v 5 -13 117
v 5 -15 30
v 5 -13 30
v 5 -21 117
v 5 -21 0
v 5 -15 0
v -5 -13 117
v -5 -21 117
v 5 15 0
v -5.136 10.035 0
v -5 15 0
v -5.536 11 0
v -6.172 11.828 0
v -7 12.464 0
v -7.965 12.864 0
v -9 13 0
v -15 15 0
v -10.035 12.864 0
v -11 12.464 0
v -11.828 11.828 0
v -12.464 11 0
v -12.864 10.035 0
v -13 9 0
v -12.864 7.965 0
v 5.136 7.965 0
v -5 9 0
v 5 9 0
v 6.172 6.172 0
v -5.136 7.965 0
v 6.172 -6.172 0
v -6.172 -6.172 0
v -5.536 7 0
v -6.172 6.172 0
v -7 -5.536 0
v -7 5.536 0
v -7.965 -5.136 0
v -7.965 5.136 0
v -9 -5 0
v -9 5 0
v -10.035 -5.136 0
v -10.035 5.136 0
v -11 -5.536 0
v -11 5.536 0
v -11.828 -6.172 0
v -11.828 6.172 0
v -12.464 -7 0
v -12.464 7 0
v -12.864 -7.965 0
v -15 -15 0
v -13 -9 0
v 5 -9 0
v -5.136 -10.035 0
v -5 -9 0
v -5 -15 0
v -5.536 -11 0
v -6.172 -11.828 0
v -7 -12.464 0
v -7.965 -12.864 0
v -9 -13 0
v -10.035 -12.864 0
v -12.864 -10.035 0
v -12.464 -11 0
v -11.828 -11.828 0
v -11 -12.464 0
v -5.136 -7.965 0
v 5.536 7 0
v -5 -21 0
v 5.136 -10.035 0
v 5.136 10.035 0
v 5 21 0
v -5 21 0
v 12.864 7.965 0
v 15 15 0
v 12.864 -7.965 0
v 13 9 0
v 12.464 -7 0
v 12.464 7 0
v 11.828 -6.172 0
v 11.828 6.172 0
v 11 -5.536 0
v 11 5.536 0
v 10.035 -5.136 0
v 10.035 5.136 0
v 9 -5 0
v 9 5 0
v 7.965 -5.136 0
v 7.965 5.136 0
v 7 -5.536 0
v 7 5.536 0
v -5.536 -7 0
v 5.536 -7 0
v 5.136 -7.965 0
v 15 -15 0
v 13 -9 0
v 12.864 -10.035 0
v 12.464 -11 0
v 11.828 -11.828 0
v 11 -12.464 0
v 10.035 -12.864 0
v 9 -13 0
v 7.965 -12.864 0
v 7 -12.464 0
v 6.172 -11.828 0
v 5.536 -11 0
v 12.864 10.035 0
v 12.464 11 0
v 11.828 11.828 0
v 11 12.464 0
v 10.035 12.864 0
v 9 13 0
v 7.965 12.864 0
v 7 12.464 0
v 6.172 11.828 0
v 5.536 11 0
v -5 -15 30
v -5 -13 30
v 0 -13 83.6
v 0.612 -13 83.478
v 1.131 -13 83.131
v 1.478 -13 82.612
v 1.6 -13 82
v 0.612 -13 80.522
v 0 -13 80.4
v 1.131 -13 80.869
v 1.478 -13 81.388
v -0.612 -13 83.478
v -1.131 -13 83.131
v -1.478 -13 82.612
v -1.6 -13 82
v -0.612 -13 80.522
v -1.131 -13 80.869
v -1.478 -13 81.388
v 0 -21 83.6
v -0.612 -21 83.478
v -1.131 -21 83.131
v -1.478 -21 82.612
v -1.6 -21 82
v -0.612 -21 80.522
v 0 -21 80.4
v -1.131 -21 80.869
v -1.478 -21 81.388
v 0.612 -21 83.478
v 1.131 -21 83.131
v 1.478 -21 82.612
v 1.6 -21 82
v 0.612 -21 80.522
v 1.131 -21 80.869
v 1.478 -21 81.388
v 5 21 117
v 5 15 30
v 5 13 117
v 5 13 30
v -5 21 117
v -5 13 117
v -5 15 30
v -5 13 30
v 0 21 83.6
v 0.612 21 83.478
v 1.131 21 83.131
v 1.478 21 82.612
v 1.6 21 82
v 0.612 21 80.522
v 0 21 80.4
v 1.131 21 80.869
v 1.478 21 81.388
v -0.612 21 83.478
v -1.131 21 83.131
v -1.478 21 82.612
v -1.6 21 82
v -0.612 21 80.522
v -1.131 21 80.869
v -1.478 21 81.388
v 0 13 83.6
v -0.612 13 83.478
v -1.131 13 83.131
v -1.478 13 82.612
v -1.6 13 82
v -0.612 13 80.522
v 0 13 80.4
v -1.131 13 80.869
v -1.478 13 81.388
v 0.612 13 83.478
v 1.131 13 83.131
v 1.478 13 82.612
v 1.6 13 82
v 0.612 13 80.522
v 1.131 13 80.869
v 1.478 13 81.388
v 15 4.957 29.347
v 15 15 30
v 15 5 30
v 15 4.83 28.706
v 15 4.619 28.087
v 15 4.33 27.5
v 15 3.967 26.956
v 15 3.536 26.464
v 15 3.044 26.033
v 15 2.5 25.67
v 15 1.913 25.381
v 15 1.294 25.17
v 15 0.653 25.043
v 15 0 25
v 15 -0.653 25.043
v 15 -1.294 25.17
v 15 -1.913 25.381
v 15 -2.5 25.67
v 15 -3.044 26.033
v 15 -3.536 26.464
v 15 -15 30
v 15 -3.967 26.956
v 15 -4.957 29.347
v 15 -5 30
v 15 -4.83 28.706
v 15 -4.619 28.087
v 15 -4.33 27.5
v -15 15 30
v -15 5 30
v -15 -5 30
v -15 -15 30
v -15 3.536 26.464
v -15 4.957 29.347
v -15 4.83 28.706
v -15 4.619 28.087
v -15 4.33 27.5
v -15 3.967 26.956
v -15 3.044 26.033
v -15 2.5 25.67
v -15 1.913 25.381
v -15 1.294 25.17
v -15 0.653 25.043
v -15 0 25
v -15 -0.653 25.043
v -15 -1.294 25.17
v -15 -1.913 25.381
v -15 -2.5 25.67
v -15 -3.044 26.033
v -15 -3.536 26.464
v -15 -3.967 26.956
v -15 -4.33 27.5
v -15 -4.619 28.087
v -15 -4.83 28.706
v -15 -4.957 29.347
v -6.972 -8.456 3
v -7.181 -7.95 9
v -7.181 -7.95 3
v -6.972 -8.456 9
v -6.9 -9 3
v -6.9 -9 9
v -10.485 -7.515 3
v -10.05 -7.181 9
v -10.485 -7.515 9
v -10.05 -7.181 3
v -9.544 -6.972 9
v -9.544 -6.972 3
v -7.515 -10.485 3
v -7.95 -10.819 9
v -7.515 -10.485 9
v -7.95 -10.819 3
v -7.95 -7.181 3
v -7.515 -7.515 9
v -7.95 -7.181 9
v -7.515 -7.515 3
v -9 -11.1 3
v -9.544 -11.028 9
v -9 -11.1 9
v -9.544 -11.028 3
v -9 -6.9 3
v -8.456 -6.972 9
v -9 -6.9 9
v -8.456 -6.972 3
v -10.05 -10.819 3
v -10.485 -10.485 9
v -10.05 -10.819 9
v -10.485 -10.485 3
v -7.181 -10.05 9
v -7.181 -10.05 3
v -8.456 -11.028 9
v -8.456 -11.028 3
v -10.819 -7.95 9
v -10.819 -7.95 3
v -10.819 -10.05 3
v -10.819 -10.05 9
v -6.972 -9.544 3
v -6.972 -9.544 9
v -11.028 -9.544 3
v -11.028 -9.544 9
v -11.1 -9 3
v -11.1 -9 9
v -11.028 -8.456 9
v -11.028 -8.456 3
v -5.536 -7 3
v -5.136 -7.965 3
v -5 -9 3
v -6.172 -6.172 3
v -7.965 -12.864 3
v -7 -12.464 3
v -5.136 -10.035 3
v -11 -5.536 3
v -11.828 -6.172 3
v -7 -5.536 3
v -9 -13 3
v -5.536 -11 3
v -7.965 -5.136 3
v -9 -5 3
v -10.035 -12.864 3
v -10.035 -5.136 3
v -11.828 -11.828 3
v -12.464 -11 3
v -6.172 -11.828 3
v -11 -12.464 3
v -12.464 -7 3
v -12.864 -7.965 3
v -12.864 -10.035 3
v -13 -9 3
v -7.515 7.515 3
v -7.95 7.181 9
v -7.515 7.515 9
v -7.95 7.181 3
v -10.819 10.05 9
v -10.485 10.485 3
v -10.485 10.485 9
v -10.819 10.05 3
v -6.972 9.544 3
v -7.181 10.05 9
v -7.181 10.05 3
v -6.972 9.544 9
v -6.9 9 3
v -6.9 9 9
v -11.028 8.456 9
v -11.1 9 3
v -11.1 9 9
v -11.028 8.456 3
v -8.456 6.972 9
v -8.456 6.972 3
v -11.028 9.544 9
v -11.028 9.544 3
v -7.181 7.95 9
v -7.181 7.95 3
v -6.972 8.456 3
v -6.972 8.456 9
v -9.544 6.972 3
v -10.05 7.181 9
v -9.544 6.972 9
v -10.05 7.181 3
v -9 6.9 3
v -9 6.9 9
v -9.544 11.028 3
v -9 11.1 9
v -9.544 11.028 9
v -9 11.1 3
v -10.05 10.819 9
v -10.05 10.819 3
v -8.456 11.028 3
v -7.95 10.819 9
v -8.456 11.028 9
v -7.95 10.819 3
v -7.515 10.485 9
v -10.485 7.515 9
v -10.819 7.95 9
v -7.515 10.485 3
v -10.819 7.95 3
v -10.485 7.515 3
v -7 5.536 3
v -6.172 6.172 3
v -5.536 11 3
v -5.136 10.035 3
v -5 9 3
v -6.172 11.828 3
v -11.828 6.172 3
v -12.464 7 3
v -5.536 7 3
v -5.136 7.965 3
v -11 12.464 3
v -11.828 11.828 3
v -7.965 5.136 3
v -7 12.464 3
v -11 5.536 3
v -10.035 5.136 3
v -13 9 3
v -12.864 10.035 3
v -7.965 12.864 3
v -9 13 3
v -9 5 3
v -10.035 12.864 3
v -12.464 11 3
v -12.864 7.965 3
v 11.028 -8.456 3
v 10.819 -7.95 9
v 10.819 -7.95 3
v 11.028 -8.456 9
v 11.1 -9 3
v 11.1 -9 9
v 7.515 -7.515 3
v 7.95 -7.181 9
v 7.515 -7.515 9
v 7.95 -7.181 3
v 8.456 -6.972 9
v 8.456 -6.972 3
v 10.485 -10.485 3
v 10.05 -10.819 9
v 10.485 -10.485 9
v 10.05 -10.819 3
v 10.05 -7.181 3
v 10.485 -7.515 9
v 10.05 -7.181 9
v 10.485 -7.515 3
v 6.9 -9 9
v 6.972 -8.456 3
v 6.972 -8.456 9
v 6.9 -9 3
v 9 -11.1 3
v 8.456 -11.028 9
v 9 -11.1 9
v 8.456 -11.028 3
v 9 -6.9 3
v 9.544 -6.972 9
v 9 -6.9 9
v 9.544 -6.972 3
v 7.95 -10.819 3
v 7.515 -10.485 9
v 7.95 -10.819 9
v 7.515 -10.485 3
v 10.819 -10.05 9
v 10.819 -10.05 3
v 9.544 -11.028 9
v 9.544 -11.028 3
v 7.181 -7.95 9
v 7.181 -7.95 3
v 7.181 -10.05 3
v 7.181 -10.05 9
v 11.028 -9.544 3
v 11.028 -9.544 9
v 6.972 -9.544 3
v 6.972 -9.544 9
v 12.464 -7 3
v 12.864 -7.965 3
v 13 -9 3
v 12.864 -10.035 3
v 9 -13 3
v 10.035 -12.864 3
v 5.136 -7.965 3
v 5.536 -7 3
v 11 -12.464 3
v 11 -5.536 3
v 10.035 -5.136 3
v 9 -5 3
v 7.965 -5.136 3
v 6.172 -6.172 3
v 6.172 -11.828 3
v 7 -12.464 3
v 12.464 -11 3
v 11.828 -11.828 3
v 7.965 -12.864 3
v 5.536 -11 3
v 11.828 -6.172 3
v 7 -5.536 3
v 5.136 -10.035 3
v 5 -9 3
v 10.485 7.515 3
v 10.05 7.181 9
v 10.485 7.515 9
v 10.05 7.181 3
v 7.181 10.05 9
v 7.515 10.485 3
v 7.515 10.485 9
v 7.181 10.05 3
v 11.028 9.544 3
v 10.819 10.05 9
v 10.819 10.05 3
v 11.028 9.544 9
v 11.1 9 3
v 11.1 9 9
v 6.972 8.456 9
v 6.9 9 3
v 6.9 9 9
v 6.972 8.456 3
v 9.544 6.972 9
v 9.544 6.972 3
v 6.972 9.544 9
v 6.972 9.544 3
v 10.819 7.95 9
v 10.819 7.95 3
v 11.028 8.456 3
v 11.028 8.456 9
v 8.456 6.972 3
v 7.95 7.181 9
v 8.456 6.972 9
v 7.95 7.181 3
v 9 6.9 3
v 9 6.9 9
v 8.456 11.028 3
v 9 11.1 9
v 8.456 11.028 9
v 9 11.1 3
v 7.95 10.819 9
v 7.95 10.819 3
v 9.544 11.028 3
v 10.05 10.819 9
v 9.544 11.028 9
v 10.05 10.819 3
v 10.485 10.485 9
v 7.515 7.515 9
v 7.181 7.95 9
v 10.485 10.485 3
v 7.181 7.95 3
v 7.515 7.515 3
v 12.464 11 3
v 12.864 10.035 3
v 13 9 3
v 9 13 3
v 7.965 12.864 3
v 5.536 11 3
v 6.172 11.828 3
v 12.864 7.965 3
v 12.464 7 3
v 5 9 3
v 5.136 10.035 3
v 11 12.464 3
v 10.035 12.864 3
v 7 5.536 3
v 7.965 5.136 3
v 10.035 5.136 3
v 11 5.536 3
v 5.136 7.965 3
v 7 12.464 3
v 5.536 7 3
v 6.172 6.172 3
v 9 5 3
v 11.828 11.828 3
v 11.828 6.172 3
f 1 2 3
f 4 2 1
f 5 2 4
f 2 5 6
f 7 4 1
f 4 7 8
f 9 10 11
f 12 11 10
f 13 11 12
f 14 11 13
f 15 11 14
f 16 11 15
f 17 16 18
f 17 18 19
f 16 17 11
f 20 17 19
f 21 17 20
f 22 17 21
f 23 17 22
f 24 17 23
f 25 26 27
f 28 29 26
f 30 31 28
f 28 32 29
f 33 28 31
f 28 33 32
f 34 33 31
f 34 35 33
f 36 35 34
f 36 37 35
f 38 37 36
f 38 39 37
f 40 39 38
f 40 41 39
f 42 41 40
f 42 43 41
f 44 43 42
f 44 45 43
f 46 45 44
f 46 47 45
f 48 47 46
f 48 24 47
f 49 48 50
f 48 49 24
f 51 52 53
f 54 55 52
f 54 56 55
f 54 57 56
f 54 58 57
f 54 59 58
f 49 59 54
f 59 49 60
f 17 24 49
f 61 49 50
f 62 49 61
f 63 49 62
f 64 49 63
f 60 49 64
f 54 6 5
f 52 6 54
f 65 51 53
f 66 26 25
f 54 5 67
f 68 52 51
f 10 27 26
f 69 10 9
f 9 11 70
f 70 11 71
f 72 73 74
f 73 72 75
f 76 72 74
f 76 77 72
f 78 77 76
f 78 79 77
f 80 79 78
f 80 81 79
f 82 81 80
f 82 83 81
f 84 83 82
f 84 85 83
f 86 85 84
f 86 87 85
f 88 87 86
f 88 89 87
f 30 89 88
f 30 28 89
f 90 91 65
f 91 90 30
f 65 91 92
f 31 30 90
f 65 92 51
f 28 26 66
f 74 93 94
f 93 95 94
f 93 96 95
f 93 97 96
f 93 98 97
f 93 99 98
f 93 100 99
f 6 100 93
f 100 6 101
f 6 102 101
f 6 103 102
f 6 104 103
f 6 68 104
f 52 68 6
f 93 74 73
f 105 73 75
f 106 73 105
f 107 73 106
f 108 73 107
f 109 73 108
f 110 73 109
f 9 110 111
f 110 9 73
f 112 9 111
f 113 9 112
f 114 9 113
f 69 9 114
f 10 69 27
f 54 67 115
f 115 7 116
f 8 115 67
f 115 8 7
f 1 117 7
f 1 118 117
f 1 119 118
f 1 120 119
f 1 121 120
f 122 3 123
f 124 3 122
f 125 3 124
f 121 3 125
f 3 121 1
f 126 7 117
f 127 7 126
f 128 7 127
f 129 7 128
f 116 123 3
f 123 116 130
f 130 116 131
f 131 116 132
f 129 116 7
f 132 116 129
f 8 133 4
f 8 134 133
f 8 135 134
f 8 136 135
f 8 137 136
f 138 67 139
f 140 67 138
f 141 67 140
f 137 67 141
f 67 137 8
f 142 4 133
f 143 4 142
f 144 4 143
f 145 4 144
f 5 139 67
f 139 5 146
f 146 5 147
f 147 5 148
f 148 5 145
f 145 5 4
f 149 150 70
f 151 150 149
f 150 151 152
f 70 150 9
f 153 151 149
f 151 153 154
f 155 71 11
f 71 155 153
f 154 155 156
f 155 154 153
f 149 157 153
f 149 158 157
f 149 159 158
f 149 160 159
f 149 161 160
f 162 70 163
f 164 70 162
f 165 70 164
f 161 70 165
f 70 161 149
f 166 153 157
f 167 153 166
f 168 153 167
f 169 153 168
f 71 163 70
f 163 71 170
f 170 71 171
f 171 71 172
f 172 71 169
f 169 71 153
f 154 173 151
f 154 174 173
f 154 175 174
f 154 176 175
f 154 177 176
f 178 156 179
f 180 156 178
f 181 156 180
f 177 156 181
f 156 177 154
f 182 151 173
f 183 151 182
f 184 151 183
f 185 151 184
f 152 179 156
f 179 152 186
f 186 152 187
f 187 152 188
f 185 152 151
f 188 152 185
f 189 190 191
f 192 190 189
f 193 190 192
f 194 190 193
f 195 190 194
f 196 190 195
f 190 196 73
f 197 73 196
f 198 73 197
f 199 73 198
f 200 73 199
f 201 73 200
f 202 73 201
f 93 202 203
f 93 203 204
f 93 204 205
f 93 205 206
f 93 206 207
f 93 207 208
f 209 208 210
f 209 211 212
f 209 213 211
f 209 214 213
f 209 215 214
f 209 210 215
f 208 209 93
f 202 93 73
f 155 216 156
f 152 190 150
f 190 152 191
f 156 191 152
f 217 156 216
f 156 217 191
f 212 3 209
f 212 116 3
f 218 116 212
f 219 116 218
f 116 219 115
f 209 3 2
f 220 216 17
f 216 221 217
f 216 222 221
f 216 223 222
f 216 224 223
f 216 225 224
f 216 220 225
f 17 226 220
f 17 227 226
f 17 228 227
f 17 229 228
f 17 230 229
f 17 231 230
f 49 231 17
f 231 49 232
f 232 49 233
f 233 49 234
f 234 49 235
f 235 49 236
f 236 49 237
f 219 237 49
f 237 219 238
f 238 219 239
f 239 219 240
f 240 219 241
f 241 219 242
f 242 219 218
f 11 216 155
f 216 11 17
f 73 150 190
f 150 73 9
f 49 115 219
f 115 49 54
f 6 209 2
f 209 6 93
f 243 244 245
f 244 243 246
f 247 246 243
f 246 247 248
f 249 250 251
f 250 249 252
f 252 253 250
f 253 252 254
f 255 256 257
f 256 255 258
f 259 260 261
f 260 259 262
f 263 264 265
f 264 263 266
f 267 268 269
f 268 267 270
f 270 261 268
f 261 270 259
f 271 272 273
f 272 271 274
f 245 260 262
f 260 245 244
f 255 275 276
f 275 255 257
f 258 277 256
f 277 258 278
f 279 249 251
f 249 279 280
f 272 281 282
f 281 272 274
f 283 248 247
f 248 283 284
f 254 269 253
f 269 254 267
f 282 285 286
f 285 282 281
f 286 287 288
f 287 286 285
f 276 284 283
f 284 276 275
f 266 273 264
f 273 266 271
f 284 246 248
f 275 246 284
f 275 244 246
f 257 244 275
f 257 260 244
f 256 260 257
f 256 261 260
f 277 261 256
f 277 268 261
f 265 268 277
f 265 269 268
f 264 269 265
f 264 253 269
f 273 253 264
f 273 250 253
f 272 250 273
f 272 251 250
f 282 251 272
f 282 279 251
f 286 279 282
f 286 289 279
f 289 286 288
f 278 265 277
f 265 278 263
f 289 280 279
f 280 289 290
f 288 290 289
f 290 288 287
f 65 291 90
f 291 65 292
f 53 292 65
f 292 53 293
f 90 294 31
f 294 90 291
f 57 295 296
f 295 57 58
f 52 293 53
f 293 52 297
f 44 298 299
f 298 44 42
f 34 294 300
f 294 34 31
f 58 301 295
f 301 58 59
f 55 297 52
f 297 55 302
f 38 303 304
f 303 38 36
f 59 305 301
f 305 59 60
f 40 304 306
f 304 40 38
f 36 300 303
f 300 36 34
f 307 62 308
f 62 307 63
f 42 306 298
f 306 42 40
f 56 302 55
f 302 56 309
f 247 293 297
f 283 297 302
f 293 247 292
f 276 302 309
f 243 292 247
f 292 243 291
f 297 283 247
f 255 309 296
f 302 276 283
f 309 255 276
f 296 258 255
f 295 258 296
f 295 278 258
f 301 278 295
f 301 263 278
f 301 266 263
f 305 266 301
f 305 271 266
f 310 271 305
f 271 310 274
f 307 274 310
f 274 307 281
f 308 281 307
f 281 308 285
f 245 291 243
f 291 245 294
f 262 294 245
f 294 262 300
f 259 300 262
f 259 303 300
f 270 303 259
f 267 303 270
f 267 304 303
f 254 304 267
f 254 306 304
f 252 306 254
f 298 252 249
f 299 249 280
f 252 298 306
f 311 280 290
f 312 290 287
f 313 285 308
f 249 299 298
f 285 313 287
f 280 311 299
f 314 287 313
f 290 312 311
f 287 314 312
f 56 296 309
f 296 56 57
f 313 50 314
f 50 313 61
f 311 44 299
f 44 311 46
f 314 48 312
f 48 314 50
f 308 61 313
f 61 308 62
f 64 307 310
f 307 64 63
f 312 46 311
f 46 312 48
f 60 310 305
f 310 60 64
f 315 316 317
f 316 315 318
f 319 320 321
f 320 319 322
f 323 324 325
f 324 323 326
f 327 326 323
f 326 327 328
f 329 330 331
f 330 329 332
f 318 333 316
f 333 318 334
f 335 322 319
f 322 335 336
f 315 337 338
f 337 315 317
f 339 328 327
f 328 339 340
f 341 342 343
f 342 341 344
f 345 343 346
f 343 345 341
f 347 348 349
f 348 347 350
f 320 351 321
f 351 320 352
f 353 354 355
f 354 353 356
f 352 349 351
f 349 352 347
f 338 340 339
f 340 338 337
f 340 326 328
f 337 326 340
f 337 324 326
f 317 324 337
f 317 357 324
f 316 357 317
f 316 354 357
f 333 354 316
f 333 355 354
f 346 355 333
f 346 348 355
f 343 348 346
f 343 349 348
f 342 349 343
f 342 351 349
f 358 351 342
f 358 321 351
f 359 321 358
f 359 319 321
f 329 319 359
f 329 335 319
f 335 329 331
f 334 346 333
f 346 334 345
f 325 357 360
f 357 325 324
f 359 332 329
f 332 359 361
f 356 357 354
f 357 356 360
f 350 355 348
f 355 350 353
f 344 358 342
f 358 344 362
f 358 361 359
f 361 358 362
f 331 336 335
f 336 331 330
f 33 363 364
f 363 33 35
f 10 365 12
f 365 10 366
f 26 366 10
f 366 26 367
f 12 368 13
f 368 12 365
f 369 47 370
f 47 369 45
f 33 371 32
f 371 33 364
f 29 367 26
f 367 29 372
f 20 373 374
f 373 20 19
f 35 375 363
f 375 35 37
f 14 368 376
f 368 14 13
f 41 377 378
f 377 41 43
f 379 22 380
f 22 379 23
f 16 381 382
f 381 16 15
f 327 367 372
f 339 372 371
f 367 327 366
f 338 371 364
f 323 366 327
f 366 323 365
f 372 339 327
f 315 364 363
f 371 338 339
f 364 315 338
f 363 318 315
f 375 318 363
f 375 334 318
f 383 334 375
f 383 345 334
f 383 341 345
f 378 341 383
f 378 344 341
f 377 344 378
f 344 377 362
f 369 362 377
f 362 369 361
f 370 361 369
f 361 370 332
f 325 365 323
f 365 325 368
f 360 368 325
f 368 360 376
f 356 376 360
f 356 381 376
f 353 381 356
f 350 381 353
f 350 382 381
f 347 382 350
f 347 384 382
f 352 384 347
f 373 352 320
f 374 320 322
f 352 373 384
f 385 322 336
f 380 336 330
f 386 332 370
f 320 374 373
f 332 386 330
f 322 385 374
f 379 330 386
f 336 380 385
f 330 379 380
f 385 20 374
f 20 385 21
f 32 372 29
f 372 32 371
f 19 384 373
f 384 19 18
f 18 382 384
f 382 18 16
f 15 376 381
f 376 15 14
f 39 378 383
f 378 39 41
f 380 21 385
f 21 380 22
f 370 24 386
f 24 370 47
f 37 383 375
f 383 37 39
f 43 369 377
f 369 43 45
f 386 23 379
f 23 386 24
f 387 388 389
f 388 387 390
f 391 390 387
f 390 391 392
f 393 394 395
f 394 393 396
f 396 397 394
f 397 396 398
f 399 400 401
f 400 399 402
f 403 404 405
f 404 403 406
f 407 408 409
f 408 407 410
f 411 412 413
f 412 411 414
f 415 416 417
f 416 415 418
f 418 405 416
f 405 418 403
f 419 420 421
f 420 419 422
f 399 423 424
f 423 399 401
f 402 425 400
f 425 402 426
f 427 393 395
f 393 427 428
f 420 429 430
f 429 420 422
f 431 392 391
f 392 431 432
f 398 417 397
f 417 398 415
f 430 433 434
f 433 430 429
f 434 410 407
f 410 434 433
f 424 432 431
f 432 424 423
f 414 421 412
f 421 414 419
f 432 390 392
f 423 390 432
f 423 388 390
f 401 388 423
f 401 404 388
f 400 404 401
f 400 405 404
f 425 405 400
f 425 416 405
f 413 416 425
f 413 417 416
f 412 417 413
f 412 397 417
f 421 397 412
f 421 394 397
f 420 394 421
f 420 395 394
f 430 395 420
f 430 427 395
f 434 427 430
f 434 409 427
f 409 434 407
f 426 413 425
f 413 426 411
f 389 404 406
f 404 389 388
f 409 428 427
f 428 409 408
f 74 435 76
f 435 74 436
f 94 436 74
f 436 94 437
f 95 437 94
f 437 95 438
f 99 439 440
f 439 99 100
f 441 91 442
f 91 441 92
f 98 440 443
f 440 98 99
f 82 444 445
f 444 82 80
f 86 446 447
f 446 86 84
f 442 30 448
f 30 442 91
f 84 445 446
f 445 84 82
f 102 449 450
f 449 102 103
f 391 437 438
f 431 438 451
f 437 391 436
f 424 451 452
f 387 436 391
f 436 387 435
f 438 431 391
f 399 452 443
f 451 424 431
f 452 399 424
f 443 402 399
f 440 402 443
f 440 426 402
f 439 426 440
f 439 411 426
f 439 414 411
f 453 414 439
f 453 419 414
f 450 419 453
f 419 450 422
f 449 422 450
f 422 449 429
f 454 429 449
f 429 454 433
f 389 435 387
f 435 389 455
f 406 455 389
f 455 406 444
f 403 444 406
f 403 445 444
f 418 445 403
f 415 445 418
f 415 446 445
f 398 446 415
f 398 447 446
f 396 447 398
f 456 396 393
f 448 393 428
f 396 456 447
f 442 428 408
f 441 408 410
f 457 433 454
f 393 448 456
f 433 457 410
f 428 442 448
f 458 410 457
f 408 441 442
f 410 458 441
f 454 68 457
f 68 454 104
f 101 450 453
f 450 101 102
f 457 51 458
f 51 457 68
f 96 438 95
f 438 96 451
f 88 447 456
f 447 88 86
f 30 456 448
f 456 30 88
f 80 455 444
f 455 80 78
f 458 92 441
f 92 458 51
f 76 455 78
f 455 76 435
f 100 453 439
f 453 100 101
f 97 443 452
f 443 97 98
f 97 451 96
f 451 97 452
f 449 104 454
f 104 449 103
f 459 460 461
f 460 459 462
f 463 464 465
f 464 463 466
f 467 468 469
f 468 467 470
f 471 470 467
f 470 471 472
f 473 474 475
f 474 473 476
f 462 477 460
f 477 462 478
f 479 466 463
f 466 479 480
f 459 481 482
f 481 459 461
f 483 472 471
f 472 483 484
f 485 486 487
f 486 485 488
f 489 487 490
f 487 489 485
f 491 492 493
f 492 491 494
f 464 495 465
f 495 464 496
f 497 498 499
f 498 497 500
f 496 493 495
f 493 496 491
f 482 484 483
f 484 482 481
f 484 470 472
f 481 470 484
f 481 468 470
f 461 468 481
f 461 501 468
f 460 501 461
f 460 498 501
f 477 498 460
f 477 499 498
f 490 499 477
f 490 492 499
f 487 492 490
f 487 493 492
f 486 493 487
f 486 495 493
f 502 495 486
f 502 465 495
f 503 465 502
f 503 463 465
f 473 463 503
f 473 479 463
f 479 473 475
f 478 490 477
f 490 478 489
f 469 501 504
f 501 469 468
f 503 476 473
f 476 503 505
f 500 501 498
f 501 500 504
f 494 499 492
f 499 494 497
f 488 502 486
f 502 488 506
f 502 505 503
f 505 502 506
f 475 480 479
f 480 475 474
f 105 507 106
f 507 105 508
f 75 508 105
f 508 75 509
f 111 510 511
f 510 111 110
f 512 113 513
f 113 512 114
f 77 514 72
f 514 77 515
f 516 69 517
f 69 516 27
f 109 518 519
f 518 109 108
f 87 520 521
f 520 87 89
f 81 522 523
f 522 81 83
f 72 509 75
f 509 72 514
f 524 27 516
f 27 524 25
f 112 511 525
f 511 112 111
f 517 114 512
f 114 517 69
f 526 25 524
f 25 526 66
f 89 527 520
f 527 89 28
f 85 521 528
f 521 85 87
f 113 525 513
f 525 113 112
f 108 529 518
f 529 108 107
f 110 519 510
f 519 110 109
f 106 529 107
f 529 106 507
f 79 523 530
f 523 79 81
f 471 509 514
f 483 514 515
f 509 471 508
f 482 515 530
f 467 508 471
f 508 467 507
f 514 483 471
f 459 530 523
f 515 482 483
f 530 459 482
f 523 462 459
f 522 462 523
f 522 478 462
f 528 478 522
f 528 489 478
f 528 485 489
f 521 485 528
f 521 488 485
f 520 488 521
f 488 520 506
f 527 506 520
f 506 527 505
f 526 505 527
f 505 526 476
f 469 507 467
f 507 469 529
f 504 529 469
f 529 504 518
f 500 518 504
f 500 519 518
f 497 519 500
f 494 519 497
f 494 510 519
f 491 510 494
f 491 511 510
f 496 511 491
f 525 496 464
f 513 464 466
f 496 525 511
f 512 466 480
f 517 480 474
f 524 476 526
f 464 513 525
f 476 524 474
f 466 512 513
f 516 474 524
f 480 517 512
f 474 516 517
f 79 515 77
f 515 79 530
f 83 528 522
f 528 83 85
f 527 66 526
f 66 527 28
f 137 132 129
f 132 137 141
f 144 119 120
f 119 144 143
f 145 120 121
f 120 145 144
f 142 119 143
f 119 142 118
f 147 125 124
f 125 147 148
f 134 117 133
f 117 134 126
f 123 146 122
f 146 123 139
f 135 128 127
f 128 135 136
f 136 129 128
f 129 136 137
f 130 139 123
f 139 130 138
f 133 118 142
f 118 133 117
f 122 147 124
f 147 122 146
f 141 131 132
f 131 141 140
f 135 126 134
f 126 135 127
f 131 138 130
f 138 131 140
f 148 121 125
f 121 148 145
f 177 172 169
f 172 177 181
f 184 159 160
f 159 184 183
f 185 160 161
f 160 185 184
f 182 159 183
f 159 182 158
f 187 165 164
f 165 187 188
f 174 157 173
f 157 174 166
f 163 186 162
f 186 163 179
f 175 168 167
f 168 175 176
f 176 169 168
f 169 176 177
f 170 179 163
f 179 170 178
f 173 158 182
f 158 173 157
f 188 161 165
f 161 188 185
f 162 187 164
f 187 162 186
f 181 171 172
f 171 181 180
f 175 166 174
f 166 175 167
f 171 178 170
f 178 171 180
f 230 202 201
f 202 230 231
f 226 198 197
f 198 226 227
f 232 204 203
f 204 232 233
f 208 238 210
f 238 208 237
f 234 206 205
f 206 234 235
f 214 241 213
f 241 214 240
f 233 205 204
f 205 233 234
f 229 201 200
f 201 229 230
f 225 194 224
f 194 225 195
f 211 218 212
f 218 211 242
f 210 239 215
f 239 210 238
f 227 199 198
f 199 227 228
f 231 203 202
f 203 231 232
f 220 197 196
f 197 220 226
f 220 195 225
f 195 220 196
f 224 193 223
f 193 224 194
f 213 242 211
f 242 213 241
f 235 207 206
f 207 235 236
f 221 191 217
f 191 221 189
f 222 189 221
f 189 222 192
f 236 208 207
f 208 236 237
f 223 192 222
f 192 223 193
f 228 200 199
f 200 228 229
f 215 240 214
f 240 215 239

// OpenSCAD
// file: ../common.scad
/*
 * WAVE OCEAN V10 - TWISTED CAM SYSTEM
 * COMMON PARAMETERS
 *
 * Simplified mechanism: slats rest on cam surface, no follower arms
 * Single helical ridge creates traveling wave as cam rotates
 *
 * All dimensions in mm
 */

// ============================================
// PRINT TOLERANCES (tune for your printer)
// ============================================

TOL_CLEARANCE = 0.2;         // Shaft in hole clearance
TOL_PRESS_FIT = -0.15;       // Bearing press-fit interference
TOL_SLIDING = 0.3;           // Sliding fit (slats in guides)

// ============================================
// HARDWARE - BEARINGS
// ============================================

// 608 bearing (main shaft) - common, cheap
BEARING_608_ID = 8;
BEARING_608_OD = 22;
BEARING_608_H = 7;

// ============================================
// HARDWARE - FASTENERS
// ============================================

M3_HOLE = 3.2;
M3_HEAD_DIA = 5.5;
M3_HEAD_H = 3;
M4_HOLE = 4.2;

// ============================================
// MAIN SHAFT
// ============================================

SHAFT_DIA = 8;                   // 8mm steel rod
SHAFT_LENGTH = 260;              // Total shaft length
SHAFT_HOLE = SHAFT_DIA + TOL_CLEARANCE;  // 8.2mm

// ============================================
// TWISTED CAM DIMENSIONS
// ============================================

CAM_LENGTH = 200;                // Active wave zone
CAM_CORE_RADIUS = 12;            // Base cylinder radius
CAM_RIDGE_HEIGHT = 10;           // How much ridge sticks out
CAM_RIDGE_WIDTH = 8;             // Width of ridge (smoothness)
CAM_MAX_RADIUS = CAM_CORE_RADIUS + CAM_RIDGE_HEIGHT;  // 22mm

// Helix parameters
HELIX_TURNS = 2;                 // Number of complete spirals
HELIX_PITCH = CAM_LENGTH / HELIX_TURNS;  // 100mm per turn

// ============================================
// SLAT DIMENSIONS
// ============================================

NUM_SLATS = 24;
SLAT_SPACING = CAM_LENGTH / NUM_SLATS;  // 8.33mm

SLAT_WIDTH = 6;                  // X dimension (along cam axis)
SLAT_DEPTH = 30;                 // Y dimension (front to back)
SLAT_HEIGHT = 50;                // Z dimension (wave visual height)

// Slat bottom - curved to nest on cam surface
SLAT_CURVE_RADIUS = CAM_CORE_RADIUS + 2;  // Slightly larger than core

// Wave motion
WAVE_AMPLITUDE = CAM_RIDGE_HEIGHT;  // Total Z travel = ridge height

// ============================================
// GUIDE RAIL DIMENSIONS
// ============================================

// Minimal guides - thin vertical slots, barely visible
GUIDE_LENGTH = CAM_LENGTH + 20;  // 220mm
GUIDE_HEIGHT = WAVE_AMPLITUDE + SLAT_HEIGHT + 10;  // 70mm
GUIDE_THICKNESS = 3;             // Very thin - minimal visual impact
GUIDE_WALL = 2;

SLOT_WIDTH = SLAT_WIDTH + TOL_SLIDING;  // 6.3mm
SLOT_HEIGHT = WAVE_AMPLITUDE + 15;       // 25mm vertical travel

// ============================================
// BEARING BLOCK DIMENSIONS
// ============================================

BB_WIDTH = 30;
BB_DEPTH = 30;
BB_HEIGHT = CAM_MAX_RADIUS + 8;  // 30mm - cam clears base

BEARING_POCKET_DIA = BEARING_608_OD - TOL_PRESS_FIT;  // 22.15mm press fit
BEARING_POCKET_DEPTH = BEARING_608_H + 0.5;           // 7.5mm

// ============================================
// BASE PLATE DIMENSIONS
// ============================================

BASE_LENGTH = CAM_LENGTH + 60;   // 260mm
BASE_WIDTH = SLAT_DEPTH + 40;    // 70mm
BASE_THICKNESS = 5;

// ============================================
// ASSEMBLY POSITIONS
// ============================================

// Cam center Z (shaft axis height above base)
CAM_CENTER_Z = BASE_THICKNESS + BB_HEIGHT;  // 35mm

// Bearing blocks X positions
BB_LEFT_X = -CAM_LENGTH/2 - BB_WIDTH/2 - 5;   // -120mm
BB_RIGHT_X = CAM_LENGTH/2 + BB_WIDTH/2 + 5;   // +120mm

// Guide rails Y positions (front and back of slats)
GUIDE_FRONT_Y = -SLAT_DEPTH/2 - GUIDE_THICKNESS - 1;  // -17mm
GUIDE_BACK_Y = SLAT_DEPTH/2 + 1;                       // +16mm

// Guide rails Z position (bottom of guide)
GUIDE_Z = CAM_CENTER_Z + CAM_MAX_RADIUS - 5;  // 52mm

// ============================================
// COLORS
// ============================================

C_CAM = [0.7, 0.5, 0.25];        // Wood brown
C_SLAT = [0.15, 0.35, 0.6];      // Ocean blue
C_GUIDE = [0.3, 0.3, 0.35, 0.5]; // Dark gray, semi-transparent
C_BB = [0.35, 0.35, 0.4];        // Bearing block gray
C_BASE = [0.25, 0.25, 0.3];      // Dark base
C_SHAFT = [0.6, 0.6, 0.65];      // Steel

// ============================================
// HELPER FUNCTIONS
// ============================================

// Helix phase at position X along cam (0-360 per turn)
function helix_phase(x) = ((x + CAM_LENGTH/2) / CAM_LENGTH) * 360 * HELIX_TURNS;

// Cam surface height at position X, given cam rotation angle theta
// Returns how far the ridge sticks up at that X position
function ridge_height(x, theta) =
    let(phase = helix_phase(x) + theta)
    let(ridge = CAM_RIDGE_HEIGHT * max(0, cos(phase - 90)))
    ridge;

// Total cam radius at position X, angle theta
function cam_radius(x, theta) = CAM_CORE_RADIUS + ridge_height(x, theta);

// Slat X position (evenly spaced)
function slat_x(i) = i * SLAT_SPACING - CAM_LENGTH/2 + SLAT_SPACING/2;

// Slat Z position (bottom of slat rests on cam surface)
function slat_z(i, theta) =
    let(x = slat_x(i))
    CAM_CENTER_Z + cam_radius(x, theta);

// ============================================
// QUALITY
// ============================================

$fn = 48;

// ============================================
// VERIFICATION
// ============================================

echo("=== TWISTED CAM SYSTEM ===");
echo(str("Cam length: ", CAM_LENGTH, "mm"));
echo(str("Cam radius: ", CAM_CORE_RADIUS, "-", CAM_MAX_RADIUS, "mm"));
echo(str("Ridge height (wave amplitude): ", CAM_RIDGE_HEIGHT, "mm"));
echo(str("Helix turns: ", HELIX_TURNS));
echo(str("Slats: ", NUM_SLATS, " @ ", SLAT_SPACING, "mm spacing"));
echo(str("Slat gap: ", SLAT_SPACING - SLAT_WIDTH, "mm"));
// main file
/*
 * BEARING BLOCK - 608 Bearing Mount
 *
 * Printable part: 2x (left and right identical)
 * Print orientation: Upright (Z up)
 *
 * Features:
 * - 608 bearing pocket (press fit)
 * - Mounting holes for base plate
 * - Integrated guide rail support
 */

include <../common.scad>

$fn = 48;

// ============================================
// MAIN BEARING BLOCK MODULE
// ============================================

module bearing_block() {
    difference() {
        union() {
            // Main block body
            block_body();

            // Guide rail support arm
            guide_support();
        }

        // Bearing pocket
        bearing_pocket();

        // Shaft clearance
        shaft_clearance();

        // Base mounting holes
        mounting_holes();

        // Guide rail mounting holes
        guide_mounting_holes();
    }
}

// ============================================
// BLOCK BODY
// ============================================

module block_body() {
    // Main structural block
    translate([-BB_WIDTH/2, -BB_DEPTH/2, 0])
        cube([BB_WIDTH, BB_DEPTH, BB_HEIGHT]);
}

// ============================================
// GUIDE RAIL SUPPORT
// ============================================

module guide_support() {
    // Upright arm that holds guide rail
    support_width = 10;
    support_depth = 8;
    support_height = GUIDE_Z + GUIDE_HEIGHT - BASE_THICKNESS;

    // Front support
    translate([-support_width/2, -BB_DEPTH/2 - support_depth + 2, 0])
        cube([support_width, support_depth, support_height]);

    // Back support
    translate([-support_width/2, BB_DEPTH/2 - 2, 0])
        cube([support_width, support_depth, support_height]);
}

// ============================================
// BEARING POCKET
// ============================================

module bearing_pocket() {
    // Press-fit pocket for 608 bearing
    // Bearing sits with axis horizontal (along X)

    translate([BB_WIDTH/2 + 1, 0, BB_HEIGHT])
    rotate([0, 90, 0])
        cylinder(d = BEARING_POCKET_DIA, h = BEARING_POCKET_DEPTH + 1);

    // Also from other side for symmetry
    translate([-BB_WIDTH/2 - 1, 0, BB_HEIGHT])
    rotate([0, -90, 0])
        cylinder(d = BEARING_POCKET_DIA, h = BEARING_POCKET_DEPTH + 1);
}

// ============================================
// SHAFT CLEARANCE
// ============================================

module shaft_clearance() {
    // Through hole for shaft (larger than bearing ID)
    translate([0, 0, BB_HEIGHT])
    rotate([0, 90, 0])
        cylinder(d = BEARING_608_ID + 2, h = BB_WIDTH + 10, center = true);
}

// ============================================
// BASE MOUNTING HOLES
// ============================================

module mounting_holes() {
    // M4 holes for base plate attachment
    hole_spacing = 18;

    for (x_sign = [-1, 1]) {
        for (y_sign = [-1, 1]) {
            translate([x_sign * hole_spacing/2, y_sign * hole_spacing/2, -1])
                cylinder(d = M4_HOLE, h = 10, $fn = 24);

            // Counterbore for screw head
            translate([x_sign * hole_spacing/2, y_sign * hole_spacing/2, -1])
                cylinder(d = 8, h = 4, $fn = 24);
        }
    }
}

// ============================================
// GUIDE RAIL MOUNTING HOLES
// ============================================

module guide_mounting_holes() {
    support_height = GUIDE_Z + GUIDE_HEIGHT/2 - BASE_THICKNESS;

    // Front guide rail hole
    translate([0, -BB_DEPTH/2 - 5, support_height])
    rotate([90, 0, 0])
        cylinder(d = M3_HOLE, h = 20, center = true, $fn = 16);

    // Back guide rail hole
    translate([0, BB_DEPTH/2 + 5, support_height])
    rotate([90, 0, 0])
        cylinder(d = M3_HOLE, h = 20, center = true, $fn = 16);
}

// ============================================
// RENDER
// ============================================

color(C_BB)
bearing_block();

// Show bearing for reference
%translate([BB_WIDTH/2 - BEARING_POCKET_DEPTH/2, 0, BB_HEIGHT])
rotate([0, 90, 0])
    cylinder(d = BEARING_608_OD, h = BEARING_608_H, center = true);

// ============================================
// INFO
// ============================================

echo("=== BEARING BLOCK ===");
echo(str("Size: ", BB_WIDTH, " x ", BB_DEPTH, " x ", BB_HEIGHT, "mm"));
echo(str("Bearing: 608 (", BEARING_608_OD, "mm OD)"));
echo(str("Bearing pocket: ", BEARING_POCKET_DIA, "mm (press fit)"));
echo("");
echo("Print: 2x (identical, mount facing inward)");
echo("Orientation: Upright (Z up)");
echo("Material: PETG recommended (stronger)");
